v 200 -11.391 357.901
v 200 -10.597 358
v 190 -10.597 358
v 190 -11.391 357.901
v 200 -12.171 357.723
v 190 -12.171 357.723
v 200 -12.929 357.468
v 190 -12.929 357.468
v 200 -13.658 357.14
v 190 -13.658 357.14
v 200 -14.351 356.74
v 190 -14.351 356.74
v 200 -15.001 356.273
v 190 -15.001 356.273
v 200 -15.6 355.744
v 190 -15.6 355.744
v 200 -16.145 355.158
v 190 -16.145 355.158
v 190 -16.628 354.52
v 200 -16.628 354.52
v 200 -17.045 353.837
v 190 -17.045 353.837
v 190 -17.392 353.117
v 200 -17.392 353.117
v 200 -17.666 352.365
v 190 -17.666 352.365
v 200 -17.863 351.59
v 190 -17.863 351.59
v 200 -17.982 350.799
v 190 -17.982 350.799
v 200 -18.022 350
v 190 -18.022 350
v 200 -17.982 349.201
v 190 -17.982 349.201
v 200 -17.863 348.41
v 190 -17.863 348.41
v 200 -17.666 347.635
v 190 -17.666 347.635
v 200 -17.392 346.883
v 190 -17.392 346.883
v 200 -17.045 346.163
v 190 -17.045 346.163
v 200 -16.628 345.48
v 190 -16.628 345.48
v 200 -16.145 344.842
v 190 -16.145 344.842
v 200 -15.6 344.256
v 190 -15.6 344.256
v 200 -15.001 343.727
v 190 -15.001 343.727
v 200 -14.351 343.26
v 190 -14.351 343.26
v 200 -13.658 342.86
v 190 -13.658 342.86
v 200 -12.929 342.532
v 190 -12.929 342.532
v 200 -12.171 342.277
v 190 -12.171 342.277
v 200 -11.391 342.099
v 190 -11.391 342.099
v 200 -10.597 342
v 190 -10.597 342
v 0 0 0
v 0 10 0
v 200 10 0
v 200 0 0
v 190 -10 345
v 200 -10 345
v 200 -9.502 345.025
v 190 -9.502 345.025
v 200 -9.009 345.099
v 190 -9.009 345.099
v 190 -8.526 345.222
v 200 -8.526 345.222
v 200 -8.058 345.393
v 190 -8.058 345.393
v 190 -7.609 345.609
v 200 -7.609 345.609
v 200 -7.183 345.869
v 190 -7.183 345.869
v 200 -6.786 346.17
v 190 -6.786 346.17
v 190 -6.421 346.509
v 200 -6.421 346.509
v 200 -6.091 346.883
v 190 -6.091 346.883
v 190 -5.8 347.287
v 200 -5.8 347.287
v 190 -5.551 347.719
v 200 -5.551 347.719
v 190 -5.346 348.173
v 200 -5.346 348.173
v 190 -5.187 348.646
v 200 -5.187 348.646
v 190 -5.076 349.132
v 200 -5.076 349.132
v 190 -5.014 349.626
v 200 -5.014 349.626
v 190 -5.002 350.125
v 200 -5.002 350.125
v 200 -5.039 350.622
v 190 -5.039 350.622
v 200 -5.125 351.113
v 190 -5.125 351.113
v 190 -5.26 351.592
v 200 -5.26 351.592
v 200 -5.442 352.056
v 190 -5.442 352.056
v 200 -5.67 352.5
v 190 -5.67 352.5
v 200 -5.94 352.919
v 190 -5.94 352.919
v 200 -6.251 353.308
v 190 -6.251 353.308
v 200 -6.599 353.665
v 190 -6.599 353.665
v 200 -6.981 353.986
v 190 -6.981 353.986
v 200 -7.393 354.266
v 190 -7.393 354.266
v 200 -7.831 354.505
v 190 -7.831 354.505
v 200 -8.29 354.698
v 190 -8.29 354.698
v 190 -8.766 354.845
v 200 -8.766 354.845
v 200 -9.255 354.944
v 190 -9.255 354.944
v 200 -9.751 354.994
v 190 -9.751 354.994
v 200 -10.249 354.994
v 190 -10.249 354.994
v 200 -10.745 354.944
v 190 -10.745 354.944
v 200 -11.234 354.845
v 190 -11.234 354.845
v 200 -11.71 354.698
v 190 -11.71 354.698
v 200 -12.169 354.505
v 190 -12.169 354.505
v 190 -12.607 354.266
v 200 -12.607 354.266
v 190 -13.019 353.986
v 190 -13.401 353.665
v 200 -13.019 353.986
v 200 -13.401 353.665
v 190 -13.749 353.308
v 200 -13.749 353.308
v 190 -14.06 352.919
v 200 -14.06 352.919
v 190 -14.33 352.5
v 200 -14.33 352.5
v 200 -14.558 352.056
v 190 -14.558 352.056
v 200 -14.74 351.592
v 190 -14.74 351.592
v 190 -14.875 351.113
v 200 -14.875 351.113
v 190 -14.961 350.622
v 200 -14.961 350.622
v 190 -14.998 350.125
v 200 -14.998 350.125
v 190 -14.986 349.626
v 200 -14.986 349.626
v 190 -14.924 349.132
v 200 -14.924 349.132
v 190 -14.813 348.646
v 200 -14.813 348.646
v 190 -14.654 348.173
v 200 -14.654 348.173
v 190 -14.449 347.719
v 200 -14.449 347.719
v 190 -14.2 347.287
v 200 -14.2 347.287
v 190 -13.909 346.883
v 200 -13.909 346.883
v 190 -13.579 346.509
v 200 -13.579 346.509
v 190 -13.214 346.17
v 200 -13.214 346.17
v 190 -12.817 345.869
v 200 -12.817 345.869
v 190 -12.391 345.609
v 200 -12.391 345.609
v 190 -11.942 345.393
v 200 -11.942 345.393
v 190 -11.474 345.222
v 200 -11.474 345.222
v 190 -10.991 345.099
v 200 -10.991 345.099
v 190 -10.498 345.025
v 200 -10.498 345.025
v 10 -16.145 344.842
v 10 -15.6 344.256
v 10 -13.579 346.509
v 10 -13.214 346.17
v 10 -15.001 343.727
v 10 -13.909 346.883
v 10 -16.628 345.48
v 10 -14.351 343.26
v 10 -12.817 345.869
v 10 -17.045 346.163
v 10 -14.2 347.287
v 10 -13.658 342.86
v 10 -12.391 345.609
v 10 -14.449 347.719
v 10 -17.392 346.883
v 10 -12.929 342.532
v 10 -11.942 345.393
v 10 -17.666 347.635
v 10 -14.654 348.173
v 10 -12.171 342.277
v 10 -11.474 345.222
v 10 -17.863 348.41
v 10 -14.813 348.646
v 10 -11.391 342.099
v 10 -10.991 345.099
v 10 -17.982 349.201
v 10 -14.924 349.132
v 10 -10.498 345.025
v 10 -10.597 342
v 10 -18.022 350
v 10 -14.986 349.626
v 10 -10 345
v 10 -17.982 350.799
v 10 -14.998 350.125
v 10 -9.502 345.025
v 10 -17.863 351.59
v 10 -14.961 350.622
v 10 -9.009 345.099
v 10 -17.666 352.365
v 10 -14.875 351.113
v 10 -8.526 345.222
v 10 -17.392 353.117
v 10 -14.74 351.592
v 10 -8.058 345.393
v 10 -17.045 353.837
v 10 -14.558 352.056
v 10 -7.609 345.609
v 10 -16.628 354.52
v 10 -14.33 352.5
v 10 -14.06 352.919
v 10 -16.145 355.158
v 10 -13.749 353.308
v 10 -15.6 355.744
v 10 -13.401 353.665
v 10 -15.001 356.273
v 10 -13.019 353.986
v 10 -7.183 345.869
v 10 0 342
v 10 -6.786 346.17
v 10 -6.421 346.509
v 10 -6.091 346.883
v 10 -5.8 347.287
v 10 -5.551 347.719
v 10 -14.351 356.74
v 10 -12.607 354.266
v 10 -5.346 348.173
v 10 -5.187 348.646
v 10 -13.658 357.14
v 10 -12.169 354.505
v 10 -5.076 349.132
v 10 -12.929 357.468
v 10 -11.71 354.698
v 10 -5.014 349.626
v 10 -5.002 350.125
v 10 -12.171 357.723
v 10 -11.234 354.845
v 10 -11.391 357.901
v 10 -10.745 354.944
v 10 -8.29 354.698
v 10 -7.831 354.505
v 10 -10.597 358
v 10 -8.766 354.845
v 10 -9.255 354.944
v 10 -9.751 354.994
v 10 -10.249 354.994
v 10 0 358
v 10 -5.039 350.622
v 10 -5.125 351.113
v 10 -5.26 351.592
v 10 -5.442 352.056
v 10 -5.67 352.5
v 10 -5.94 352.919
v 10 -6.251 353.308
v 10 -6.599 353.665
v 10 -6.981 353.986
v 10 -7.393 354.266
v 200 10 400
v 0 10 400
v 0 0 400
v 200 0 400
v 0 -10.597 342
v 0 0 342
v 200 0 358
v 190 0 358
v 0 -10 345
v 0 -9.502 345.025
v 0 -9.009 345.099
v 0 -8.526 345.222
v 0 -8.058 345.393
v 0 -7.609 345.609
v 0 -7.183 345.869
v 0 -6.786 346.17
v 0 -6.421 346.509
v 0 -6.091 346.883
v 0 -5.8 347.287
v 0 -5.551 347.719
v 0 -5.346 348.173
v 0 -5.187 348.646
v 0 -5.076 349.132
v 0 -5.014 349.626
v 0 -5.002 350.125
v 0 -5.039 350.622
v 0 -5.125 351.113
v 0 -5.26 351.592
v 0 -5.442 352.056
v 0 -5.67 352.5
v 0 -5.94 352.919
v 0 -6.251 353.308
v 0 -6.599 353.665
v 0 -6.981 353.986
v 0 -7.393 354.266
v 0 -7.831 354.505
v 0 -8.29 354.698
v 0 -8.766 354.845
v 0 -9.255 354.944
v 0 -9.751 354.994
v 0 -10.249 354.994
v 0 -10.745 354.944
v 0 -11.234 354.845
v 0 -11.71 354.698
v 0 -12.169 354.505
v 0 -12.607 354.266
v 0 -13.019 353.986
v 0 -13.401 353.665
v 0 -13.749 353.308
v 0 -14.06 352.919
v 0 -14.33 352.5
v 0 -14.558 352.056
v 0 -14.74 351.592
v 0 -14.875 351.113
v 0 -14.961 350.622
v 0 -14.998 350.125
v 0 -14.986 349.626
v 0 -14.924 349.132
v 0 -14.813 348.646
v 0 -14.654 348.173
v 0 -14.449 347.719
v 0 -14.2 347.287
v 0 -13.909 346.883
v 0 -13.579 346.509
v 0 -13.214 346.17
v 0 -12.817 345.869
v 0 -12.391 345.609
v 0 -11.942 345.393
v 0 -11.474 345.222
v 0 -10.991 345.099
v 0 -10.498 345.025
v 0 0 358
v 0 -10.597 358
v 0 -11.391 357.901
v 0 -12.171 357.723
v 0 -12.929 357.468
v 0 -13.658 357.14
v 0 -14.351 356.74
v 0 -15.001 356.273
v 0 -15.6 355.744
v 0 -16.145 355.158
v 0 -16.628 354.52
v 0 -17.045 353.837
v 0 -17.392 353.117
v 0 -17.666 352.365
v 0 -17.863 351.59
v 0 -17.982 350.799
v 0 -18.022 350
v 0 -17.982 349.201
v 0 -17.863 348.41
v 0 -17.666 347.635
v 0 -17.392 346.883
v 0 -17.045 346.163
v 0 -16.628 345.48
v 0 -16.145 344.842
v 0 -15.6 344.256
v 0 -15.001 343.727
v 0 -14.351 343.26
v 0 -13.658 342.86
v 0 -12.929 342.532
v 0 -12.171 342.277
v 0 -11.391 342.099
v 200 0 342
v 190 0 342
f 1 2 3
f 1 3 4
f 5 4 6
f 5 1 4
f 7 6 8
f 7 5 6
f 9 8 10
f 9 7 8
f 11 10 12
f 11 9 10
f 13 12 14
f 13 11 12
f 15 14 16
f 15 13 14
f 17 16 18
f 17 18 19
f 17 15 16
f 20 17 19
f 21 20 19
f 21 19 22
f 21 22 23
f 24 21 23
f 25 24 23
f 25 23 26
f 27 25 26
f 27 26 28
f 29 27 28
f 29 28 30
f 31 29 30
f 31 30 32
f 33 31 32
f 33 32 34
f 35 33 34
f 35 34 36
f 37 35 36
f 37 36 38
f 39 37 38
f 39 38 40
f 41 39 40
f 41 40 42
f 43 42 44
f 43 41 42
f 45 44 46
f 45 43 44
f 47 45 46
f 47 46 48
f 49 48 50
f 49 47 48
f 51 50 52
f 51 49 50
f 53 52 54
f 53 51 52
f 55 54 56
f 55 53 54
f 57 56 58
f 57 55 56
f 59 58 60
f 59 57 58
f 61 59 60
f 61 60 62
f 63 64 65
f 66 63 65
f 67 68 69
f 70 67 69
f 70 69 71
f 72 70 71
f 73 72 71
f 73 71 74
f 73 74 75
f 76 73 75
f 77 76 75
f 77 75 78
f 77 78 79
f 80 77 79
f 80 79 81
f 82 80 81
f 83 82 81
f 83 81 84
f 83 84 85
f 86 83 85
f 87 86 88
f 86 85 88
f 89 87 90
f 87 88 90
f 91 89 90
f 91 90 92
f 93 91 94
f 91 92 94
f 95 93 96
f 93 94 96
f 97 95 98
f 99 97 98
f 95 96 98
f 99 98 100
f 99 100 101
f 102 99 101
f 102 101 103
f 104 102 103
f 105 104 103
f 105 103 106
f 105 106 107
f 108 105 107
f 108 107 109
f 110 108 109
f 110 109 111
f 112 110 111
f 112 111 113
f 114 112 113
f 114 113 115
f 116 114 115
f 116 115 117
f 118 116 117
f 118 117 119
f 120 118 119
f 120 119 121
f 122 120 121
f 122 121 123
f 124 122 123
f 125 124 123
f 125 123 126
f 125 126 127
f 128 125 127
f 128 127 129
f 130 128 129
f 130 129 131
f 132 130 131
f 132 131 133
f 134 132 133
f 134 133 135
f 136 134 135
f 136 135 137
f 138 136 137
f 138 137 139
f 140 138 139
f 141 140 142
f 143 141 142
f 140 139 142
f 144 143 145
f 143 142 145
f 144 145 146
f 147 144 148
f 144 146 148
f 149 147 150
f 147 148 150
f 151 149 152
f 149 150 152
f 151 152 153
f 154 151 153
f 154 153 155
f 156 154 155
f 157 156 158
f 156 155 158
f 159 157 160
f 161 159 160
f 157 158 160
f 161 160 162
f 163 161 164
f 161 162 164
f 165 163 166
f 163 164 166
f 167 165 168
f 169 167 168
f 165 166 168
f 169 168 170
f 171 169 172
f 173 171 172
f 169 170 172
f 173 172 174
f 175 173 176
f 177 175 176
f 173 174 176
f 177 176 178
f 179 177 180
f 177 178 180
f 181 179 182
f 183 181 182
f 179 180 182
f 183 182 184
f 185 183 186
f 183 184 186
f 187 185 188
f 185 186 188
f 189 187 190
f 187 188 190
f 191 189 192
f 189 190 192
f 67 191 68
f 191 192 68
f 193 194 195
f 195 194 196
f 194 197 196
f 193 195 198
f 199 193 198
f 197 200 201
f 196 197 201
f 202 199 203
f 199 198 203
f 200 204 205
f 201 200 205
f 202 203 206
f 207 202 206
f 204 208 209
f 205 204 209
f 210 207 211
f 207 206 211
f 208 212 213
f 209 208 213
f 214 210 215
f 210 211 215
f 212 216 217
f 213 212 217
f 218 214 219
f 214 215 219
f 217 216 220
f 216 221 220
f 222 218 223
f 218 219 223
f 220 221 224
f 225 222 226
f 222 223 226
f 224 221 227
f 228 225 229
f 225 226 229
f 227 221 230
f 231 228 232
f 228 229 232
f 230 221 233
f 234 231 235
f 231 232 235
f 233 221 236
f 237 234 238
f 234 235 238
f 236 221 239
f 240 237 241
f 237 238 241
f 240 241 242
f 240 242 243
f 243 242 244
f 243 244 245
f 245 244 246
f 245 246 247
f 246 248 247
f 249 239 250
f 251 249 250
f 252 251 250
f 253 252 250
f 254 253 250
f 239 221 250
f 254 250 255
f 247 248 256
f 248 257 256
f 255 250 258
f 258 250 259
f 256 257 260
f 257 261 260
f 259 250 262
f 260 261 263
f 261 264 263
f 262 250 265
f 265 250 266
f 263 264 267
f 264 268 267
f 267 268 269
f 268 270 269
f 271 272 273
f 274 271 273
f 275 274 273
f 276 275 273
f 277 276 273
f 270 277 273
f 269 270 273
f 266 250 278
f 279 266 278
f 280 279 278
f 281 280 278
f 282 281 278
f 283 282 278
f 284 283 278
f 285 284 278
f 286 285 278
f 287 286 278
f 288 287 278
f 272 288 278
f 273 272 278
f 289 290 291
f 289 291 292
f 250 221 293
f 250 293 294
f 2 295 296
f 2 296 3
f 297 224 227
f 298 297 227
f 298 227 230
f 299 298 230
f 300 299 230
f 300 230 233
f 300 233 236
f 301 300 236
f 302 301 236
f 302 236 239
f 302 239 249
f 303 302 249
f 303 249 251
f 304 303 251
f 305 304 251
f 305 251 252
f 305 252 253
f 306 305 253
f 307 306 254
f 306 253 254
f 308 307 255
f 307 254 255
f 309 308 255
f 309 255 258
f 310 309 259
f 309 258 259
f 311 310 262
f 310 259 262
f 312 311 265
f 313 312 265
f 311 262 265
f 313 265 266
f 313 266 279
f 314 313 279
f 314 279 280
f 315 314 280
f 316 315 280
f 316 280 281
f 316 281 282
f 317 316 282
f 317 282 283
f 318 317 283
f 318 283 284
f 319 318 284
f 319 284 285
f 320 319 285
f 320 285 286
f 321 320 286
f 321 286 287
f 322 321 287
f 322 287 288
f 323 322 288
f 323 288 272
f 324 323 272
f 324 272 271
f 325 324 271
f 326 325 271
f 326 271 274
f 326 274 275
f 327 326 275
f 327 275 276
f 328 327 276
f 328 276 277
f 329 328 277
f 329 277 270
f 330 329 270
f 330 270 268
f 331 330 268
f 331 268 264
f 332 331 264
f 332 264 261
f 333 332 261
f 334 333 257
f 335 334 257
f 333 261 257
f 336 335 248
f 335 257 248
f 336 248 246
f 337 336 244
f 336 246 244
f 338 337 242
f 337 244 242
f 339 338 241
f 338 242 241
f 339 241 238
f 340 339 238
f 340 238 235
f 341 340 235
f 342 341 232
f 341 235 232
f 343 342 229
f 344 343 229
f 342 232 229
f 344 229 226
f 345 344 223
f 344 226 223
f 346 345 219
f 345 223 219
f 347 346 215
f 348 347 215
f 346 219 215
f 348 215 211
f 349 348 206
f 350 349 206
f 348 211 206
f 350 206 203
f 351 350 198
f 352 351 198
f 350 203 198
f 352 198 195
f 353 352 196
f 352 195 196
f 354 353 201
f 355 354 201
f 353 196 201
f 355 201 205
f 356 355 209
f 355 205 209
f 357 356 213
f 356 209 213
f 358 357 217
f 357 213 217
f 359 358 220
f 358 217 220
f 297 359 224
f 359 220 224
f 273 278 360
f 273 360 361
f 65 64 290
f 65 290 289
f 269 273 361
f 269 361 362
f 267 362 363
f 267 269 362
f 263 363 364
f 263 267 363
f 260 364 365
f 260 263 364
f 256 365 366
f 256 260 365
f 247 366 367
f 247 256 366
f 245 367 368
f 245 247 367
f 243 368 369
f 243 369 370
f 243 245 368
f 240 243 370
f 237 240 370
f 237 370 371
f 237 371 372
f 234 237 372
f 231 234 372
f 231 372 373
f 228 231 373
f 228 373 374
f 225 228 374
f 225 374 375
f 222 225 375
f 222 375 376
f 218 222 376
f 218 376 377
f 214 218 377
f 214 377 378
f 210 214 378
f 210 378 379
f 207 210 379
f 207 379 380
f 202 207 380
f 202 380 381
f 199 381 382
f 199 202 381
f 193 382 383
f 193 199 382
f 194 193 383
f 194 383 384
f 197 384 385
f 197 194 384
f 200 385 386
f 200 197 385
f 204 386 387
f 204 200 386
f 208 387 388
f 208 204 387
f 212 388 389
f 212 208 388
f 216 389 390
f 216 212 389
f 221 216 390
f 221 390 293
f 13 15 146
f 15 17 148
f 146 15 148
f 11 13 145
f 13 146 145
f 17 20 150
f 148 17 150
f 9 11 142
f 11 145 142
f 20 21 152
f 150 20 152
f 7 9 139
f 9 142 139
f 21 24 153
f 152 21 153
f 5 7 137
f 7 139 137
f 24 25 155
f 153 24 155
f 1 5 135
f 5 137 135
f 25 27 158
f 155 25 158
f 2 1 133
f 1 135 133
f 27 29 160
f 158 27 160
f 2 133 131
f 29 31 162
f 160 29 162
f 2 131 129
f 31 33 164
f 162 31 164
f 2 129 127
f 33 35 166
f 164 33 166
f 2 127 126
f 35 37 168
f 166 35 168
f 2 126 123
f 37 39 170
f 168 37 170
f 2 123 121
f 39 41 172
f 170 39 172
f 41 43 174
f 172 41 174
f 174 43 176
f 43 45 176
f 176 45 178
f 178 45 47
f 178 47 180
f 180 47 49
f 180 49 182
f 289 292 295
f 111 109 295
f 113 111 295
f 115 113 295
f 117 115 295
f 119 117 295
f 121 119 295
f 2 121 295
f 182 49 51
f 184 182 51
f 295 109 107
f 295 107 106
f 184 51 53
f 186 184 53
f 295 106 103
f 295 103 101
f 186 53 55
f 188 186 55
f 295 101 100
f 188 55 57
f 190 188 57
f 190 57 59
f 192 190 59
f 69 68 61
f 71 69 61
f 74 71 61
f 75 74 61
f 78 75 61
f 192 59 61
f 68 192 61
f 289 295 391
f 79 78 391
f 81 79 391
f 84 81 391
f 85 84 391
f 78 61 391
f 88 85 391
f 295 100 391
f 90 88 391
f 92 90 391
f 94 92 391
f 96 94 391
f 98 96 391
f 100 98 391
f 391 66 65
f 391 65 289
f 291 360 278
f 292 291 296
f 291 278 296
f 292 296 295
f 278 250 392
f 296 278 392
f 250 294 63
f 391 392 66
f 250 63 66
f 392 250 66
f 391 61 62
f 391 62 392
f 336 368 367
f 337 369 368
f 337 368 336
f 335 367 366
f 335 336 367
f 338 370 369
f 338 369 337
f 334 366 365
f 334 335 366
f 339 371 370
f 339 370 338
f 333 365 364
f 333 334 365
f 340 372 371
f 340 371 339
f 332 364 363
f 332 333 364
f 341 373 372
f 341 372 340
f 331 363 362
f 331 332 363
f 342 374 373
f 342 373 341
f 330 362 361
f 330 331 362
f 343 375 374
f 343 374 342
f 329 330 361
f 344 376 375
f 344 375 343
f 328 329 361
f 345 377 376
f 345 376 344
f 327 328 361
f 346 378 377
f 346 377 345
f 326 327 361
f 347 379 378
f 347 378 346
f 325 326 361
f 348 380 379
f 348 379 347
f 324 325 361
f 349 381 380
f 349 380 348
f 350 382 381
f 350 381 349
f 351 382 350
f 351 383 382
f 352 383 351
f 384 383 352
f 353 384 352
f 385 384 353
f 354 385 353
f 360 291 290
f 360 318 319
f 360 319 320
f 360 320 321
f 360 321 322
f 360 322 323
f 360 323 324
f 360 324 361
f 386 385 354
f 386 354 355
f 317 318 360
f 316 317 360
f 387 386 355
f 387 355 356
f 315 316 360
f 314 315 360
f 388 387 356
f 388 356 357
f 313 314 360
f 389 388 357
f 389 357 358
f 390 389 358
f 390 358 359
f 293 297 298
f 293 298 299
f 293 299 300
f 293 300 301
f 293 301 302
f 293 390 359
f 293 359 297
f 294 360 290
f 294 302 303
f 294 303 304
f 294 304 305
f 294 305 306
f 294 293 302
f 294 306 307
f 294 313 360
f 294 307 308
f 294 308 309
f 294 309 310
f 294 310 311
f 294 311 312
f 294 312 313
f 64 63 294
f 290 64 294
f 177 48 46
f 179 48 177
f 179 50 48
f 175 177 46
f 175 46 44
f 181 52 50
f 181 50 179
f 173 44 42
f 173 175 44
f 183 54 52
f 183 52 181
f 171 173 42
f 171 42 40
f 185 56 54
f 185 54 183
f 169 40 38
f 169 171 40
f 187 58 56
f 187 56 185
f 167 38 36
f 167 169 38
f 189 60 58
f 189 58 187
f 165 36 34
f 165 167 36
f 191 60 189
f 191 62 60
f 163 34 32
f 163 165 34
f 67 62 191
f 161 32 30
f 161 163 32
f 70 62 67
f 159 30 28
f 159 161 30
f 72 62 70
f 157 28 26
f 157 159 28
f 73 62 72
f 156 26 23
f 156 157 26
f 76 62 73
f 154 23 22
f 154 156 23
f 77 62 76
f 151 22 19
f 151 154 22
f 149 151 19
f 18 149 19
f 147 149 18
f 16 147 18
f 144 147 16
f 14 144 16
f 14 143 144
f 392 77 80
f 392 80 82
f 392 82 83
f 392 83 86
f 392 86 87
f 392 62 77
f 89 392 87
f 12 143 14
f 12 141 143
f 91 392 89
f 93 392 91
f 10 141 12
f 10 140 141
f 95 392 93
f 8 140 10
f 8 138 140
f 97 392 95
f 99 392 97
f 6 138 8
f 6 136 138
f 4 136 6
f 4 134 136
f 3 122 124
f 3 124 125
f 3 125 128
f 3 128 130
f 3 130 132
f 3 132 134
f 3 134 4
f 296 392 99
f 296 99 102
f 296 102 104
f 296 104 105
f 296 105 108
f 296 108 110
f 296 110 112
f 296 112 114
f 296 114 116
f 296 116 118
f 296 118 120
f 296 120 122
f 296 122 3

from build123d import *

# Parameters (mm, degrees)
SKETCH3_W           = 200
SKETCH3_H           = 10
BOSS_EXTRUDE1_DEPTH = 400
SKETCH4_R           = 5
BOSS_EXTRUDE2_DEPTH = 200
SKETCH5_W           = 180
SKETCH5_H           = 16
CUT_EXTRUDE1_DEPTH  = 75


with BuildPart() as part:
    # Sketch3 → Boss-Extrude1 (new body)
    with BuildSketch(Plane.XY):
        with Locations((100, 5)):
            Rectangle(SKETCH3_W, SKETCH3_H)
    extrude(amount=BOSS_EXTRUDE1_DEPTH)

    # Sketch4 → Boss-Extrude2 (add)
    with BuildSketch(Plane(origin=(200, 0, 0), x_dir=(0, 0, -1), z_dir=(1, 0, 0))):
        with BuildLine():
            Line((-342, 0), (-358, 0))
            Line((-358, 0), (-358, -9.403084831))
            Line((-358, -9.403084831), (-358, -10.596915169))
            ThreePointArc((-358, -10.596915169), (-350, -18.022238323), (-342, -10.596915169))
            Line((-342, -10.596915169), (-342, -9.403084831))
            Line((-342, -9.403084831), (-342, 0))
        make_face()
        with Locations((-350, -10)):
            Circle(SKETCH4_R, mode=Mode.SUBTRACT)
    extrude(amount=-BOSS_EXTRUDE2_DEPTH)

    # Sketch5 → Cut-Extrude1 (cut)
    with BuildSketch(Plane.XZ):
        with Locations((100, 350)):
            Rectangle(SKETCH5_W, SKETCH5_H)
    extrude(amount=CUT_EXTRUDE1_DEPTH, mode=Mode.SUBTRACT)


solid = part.part
